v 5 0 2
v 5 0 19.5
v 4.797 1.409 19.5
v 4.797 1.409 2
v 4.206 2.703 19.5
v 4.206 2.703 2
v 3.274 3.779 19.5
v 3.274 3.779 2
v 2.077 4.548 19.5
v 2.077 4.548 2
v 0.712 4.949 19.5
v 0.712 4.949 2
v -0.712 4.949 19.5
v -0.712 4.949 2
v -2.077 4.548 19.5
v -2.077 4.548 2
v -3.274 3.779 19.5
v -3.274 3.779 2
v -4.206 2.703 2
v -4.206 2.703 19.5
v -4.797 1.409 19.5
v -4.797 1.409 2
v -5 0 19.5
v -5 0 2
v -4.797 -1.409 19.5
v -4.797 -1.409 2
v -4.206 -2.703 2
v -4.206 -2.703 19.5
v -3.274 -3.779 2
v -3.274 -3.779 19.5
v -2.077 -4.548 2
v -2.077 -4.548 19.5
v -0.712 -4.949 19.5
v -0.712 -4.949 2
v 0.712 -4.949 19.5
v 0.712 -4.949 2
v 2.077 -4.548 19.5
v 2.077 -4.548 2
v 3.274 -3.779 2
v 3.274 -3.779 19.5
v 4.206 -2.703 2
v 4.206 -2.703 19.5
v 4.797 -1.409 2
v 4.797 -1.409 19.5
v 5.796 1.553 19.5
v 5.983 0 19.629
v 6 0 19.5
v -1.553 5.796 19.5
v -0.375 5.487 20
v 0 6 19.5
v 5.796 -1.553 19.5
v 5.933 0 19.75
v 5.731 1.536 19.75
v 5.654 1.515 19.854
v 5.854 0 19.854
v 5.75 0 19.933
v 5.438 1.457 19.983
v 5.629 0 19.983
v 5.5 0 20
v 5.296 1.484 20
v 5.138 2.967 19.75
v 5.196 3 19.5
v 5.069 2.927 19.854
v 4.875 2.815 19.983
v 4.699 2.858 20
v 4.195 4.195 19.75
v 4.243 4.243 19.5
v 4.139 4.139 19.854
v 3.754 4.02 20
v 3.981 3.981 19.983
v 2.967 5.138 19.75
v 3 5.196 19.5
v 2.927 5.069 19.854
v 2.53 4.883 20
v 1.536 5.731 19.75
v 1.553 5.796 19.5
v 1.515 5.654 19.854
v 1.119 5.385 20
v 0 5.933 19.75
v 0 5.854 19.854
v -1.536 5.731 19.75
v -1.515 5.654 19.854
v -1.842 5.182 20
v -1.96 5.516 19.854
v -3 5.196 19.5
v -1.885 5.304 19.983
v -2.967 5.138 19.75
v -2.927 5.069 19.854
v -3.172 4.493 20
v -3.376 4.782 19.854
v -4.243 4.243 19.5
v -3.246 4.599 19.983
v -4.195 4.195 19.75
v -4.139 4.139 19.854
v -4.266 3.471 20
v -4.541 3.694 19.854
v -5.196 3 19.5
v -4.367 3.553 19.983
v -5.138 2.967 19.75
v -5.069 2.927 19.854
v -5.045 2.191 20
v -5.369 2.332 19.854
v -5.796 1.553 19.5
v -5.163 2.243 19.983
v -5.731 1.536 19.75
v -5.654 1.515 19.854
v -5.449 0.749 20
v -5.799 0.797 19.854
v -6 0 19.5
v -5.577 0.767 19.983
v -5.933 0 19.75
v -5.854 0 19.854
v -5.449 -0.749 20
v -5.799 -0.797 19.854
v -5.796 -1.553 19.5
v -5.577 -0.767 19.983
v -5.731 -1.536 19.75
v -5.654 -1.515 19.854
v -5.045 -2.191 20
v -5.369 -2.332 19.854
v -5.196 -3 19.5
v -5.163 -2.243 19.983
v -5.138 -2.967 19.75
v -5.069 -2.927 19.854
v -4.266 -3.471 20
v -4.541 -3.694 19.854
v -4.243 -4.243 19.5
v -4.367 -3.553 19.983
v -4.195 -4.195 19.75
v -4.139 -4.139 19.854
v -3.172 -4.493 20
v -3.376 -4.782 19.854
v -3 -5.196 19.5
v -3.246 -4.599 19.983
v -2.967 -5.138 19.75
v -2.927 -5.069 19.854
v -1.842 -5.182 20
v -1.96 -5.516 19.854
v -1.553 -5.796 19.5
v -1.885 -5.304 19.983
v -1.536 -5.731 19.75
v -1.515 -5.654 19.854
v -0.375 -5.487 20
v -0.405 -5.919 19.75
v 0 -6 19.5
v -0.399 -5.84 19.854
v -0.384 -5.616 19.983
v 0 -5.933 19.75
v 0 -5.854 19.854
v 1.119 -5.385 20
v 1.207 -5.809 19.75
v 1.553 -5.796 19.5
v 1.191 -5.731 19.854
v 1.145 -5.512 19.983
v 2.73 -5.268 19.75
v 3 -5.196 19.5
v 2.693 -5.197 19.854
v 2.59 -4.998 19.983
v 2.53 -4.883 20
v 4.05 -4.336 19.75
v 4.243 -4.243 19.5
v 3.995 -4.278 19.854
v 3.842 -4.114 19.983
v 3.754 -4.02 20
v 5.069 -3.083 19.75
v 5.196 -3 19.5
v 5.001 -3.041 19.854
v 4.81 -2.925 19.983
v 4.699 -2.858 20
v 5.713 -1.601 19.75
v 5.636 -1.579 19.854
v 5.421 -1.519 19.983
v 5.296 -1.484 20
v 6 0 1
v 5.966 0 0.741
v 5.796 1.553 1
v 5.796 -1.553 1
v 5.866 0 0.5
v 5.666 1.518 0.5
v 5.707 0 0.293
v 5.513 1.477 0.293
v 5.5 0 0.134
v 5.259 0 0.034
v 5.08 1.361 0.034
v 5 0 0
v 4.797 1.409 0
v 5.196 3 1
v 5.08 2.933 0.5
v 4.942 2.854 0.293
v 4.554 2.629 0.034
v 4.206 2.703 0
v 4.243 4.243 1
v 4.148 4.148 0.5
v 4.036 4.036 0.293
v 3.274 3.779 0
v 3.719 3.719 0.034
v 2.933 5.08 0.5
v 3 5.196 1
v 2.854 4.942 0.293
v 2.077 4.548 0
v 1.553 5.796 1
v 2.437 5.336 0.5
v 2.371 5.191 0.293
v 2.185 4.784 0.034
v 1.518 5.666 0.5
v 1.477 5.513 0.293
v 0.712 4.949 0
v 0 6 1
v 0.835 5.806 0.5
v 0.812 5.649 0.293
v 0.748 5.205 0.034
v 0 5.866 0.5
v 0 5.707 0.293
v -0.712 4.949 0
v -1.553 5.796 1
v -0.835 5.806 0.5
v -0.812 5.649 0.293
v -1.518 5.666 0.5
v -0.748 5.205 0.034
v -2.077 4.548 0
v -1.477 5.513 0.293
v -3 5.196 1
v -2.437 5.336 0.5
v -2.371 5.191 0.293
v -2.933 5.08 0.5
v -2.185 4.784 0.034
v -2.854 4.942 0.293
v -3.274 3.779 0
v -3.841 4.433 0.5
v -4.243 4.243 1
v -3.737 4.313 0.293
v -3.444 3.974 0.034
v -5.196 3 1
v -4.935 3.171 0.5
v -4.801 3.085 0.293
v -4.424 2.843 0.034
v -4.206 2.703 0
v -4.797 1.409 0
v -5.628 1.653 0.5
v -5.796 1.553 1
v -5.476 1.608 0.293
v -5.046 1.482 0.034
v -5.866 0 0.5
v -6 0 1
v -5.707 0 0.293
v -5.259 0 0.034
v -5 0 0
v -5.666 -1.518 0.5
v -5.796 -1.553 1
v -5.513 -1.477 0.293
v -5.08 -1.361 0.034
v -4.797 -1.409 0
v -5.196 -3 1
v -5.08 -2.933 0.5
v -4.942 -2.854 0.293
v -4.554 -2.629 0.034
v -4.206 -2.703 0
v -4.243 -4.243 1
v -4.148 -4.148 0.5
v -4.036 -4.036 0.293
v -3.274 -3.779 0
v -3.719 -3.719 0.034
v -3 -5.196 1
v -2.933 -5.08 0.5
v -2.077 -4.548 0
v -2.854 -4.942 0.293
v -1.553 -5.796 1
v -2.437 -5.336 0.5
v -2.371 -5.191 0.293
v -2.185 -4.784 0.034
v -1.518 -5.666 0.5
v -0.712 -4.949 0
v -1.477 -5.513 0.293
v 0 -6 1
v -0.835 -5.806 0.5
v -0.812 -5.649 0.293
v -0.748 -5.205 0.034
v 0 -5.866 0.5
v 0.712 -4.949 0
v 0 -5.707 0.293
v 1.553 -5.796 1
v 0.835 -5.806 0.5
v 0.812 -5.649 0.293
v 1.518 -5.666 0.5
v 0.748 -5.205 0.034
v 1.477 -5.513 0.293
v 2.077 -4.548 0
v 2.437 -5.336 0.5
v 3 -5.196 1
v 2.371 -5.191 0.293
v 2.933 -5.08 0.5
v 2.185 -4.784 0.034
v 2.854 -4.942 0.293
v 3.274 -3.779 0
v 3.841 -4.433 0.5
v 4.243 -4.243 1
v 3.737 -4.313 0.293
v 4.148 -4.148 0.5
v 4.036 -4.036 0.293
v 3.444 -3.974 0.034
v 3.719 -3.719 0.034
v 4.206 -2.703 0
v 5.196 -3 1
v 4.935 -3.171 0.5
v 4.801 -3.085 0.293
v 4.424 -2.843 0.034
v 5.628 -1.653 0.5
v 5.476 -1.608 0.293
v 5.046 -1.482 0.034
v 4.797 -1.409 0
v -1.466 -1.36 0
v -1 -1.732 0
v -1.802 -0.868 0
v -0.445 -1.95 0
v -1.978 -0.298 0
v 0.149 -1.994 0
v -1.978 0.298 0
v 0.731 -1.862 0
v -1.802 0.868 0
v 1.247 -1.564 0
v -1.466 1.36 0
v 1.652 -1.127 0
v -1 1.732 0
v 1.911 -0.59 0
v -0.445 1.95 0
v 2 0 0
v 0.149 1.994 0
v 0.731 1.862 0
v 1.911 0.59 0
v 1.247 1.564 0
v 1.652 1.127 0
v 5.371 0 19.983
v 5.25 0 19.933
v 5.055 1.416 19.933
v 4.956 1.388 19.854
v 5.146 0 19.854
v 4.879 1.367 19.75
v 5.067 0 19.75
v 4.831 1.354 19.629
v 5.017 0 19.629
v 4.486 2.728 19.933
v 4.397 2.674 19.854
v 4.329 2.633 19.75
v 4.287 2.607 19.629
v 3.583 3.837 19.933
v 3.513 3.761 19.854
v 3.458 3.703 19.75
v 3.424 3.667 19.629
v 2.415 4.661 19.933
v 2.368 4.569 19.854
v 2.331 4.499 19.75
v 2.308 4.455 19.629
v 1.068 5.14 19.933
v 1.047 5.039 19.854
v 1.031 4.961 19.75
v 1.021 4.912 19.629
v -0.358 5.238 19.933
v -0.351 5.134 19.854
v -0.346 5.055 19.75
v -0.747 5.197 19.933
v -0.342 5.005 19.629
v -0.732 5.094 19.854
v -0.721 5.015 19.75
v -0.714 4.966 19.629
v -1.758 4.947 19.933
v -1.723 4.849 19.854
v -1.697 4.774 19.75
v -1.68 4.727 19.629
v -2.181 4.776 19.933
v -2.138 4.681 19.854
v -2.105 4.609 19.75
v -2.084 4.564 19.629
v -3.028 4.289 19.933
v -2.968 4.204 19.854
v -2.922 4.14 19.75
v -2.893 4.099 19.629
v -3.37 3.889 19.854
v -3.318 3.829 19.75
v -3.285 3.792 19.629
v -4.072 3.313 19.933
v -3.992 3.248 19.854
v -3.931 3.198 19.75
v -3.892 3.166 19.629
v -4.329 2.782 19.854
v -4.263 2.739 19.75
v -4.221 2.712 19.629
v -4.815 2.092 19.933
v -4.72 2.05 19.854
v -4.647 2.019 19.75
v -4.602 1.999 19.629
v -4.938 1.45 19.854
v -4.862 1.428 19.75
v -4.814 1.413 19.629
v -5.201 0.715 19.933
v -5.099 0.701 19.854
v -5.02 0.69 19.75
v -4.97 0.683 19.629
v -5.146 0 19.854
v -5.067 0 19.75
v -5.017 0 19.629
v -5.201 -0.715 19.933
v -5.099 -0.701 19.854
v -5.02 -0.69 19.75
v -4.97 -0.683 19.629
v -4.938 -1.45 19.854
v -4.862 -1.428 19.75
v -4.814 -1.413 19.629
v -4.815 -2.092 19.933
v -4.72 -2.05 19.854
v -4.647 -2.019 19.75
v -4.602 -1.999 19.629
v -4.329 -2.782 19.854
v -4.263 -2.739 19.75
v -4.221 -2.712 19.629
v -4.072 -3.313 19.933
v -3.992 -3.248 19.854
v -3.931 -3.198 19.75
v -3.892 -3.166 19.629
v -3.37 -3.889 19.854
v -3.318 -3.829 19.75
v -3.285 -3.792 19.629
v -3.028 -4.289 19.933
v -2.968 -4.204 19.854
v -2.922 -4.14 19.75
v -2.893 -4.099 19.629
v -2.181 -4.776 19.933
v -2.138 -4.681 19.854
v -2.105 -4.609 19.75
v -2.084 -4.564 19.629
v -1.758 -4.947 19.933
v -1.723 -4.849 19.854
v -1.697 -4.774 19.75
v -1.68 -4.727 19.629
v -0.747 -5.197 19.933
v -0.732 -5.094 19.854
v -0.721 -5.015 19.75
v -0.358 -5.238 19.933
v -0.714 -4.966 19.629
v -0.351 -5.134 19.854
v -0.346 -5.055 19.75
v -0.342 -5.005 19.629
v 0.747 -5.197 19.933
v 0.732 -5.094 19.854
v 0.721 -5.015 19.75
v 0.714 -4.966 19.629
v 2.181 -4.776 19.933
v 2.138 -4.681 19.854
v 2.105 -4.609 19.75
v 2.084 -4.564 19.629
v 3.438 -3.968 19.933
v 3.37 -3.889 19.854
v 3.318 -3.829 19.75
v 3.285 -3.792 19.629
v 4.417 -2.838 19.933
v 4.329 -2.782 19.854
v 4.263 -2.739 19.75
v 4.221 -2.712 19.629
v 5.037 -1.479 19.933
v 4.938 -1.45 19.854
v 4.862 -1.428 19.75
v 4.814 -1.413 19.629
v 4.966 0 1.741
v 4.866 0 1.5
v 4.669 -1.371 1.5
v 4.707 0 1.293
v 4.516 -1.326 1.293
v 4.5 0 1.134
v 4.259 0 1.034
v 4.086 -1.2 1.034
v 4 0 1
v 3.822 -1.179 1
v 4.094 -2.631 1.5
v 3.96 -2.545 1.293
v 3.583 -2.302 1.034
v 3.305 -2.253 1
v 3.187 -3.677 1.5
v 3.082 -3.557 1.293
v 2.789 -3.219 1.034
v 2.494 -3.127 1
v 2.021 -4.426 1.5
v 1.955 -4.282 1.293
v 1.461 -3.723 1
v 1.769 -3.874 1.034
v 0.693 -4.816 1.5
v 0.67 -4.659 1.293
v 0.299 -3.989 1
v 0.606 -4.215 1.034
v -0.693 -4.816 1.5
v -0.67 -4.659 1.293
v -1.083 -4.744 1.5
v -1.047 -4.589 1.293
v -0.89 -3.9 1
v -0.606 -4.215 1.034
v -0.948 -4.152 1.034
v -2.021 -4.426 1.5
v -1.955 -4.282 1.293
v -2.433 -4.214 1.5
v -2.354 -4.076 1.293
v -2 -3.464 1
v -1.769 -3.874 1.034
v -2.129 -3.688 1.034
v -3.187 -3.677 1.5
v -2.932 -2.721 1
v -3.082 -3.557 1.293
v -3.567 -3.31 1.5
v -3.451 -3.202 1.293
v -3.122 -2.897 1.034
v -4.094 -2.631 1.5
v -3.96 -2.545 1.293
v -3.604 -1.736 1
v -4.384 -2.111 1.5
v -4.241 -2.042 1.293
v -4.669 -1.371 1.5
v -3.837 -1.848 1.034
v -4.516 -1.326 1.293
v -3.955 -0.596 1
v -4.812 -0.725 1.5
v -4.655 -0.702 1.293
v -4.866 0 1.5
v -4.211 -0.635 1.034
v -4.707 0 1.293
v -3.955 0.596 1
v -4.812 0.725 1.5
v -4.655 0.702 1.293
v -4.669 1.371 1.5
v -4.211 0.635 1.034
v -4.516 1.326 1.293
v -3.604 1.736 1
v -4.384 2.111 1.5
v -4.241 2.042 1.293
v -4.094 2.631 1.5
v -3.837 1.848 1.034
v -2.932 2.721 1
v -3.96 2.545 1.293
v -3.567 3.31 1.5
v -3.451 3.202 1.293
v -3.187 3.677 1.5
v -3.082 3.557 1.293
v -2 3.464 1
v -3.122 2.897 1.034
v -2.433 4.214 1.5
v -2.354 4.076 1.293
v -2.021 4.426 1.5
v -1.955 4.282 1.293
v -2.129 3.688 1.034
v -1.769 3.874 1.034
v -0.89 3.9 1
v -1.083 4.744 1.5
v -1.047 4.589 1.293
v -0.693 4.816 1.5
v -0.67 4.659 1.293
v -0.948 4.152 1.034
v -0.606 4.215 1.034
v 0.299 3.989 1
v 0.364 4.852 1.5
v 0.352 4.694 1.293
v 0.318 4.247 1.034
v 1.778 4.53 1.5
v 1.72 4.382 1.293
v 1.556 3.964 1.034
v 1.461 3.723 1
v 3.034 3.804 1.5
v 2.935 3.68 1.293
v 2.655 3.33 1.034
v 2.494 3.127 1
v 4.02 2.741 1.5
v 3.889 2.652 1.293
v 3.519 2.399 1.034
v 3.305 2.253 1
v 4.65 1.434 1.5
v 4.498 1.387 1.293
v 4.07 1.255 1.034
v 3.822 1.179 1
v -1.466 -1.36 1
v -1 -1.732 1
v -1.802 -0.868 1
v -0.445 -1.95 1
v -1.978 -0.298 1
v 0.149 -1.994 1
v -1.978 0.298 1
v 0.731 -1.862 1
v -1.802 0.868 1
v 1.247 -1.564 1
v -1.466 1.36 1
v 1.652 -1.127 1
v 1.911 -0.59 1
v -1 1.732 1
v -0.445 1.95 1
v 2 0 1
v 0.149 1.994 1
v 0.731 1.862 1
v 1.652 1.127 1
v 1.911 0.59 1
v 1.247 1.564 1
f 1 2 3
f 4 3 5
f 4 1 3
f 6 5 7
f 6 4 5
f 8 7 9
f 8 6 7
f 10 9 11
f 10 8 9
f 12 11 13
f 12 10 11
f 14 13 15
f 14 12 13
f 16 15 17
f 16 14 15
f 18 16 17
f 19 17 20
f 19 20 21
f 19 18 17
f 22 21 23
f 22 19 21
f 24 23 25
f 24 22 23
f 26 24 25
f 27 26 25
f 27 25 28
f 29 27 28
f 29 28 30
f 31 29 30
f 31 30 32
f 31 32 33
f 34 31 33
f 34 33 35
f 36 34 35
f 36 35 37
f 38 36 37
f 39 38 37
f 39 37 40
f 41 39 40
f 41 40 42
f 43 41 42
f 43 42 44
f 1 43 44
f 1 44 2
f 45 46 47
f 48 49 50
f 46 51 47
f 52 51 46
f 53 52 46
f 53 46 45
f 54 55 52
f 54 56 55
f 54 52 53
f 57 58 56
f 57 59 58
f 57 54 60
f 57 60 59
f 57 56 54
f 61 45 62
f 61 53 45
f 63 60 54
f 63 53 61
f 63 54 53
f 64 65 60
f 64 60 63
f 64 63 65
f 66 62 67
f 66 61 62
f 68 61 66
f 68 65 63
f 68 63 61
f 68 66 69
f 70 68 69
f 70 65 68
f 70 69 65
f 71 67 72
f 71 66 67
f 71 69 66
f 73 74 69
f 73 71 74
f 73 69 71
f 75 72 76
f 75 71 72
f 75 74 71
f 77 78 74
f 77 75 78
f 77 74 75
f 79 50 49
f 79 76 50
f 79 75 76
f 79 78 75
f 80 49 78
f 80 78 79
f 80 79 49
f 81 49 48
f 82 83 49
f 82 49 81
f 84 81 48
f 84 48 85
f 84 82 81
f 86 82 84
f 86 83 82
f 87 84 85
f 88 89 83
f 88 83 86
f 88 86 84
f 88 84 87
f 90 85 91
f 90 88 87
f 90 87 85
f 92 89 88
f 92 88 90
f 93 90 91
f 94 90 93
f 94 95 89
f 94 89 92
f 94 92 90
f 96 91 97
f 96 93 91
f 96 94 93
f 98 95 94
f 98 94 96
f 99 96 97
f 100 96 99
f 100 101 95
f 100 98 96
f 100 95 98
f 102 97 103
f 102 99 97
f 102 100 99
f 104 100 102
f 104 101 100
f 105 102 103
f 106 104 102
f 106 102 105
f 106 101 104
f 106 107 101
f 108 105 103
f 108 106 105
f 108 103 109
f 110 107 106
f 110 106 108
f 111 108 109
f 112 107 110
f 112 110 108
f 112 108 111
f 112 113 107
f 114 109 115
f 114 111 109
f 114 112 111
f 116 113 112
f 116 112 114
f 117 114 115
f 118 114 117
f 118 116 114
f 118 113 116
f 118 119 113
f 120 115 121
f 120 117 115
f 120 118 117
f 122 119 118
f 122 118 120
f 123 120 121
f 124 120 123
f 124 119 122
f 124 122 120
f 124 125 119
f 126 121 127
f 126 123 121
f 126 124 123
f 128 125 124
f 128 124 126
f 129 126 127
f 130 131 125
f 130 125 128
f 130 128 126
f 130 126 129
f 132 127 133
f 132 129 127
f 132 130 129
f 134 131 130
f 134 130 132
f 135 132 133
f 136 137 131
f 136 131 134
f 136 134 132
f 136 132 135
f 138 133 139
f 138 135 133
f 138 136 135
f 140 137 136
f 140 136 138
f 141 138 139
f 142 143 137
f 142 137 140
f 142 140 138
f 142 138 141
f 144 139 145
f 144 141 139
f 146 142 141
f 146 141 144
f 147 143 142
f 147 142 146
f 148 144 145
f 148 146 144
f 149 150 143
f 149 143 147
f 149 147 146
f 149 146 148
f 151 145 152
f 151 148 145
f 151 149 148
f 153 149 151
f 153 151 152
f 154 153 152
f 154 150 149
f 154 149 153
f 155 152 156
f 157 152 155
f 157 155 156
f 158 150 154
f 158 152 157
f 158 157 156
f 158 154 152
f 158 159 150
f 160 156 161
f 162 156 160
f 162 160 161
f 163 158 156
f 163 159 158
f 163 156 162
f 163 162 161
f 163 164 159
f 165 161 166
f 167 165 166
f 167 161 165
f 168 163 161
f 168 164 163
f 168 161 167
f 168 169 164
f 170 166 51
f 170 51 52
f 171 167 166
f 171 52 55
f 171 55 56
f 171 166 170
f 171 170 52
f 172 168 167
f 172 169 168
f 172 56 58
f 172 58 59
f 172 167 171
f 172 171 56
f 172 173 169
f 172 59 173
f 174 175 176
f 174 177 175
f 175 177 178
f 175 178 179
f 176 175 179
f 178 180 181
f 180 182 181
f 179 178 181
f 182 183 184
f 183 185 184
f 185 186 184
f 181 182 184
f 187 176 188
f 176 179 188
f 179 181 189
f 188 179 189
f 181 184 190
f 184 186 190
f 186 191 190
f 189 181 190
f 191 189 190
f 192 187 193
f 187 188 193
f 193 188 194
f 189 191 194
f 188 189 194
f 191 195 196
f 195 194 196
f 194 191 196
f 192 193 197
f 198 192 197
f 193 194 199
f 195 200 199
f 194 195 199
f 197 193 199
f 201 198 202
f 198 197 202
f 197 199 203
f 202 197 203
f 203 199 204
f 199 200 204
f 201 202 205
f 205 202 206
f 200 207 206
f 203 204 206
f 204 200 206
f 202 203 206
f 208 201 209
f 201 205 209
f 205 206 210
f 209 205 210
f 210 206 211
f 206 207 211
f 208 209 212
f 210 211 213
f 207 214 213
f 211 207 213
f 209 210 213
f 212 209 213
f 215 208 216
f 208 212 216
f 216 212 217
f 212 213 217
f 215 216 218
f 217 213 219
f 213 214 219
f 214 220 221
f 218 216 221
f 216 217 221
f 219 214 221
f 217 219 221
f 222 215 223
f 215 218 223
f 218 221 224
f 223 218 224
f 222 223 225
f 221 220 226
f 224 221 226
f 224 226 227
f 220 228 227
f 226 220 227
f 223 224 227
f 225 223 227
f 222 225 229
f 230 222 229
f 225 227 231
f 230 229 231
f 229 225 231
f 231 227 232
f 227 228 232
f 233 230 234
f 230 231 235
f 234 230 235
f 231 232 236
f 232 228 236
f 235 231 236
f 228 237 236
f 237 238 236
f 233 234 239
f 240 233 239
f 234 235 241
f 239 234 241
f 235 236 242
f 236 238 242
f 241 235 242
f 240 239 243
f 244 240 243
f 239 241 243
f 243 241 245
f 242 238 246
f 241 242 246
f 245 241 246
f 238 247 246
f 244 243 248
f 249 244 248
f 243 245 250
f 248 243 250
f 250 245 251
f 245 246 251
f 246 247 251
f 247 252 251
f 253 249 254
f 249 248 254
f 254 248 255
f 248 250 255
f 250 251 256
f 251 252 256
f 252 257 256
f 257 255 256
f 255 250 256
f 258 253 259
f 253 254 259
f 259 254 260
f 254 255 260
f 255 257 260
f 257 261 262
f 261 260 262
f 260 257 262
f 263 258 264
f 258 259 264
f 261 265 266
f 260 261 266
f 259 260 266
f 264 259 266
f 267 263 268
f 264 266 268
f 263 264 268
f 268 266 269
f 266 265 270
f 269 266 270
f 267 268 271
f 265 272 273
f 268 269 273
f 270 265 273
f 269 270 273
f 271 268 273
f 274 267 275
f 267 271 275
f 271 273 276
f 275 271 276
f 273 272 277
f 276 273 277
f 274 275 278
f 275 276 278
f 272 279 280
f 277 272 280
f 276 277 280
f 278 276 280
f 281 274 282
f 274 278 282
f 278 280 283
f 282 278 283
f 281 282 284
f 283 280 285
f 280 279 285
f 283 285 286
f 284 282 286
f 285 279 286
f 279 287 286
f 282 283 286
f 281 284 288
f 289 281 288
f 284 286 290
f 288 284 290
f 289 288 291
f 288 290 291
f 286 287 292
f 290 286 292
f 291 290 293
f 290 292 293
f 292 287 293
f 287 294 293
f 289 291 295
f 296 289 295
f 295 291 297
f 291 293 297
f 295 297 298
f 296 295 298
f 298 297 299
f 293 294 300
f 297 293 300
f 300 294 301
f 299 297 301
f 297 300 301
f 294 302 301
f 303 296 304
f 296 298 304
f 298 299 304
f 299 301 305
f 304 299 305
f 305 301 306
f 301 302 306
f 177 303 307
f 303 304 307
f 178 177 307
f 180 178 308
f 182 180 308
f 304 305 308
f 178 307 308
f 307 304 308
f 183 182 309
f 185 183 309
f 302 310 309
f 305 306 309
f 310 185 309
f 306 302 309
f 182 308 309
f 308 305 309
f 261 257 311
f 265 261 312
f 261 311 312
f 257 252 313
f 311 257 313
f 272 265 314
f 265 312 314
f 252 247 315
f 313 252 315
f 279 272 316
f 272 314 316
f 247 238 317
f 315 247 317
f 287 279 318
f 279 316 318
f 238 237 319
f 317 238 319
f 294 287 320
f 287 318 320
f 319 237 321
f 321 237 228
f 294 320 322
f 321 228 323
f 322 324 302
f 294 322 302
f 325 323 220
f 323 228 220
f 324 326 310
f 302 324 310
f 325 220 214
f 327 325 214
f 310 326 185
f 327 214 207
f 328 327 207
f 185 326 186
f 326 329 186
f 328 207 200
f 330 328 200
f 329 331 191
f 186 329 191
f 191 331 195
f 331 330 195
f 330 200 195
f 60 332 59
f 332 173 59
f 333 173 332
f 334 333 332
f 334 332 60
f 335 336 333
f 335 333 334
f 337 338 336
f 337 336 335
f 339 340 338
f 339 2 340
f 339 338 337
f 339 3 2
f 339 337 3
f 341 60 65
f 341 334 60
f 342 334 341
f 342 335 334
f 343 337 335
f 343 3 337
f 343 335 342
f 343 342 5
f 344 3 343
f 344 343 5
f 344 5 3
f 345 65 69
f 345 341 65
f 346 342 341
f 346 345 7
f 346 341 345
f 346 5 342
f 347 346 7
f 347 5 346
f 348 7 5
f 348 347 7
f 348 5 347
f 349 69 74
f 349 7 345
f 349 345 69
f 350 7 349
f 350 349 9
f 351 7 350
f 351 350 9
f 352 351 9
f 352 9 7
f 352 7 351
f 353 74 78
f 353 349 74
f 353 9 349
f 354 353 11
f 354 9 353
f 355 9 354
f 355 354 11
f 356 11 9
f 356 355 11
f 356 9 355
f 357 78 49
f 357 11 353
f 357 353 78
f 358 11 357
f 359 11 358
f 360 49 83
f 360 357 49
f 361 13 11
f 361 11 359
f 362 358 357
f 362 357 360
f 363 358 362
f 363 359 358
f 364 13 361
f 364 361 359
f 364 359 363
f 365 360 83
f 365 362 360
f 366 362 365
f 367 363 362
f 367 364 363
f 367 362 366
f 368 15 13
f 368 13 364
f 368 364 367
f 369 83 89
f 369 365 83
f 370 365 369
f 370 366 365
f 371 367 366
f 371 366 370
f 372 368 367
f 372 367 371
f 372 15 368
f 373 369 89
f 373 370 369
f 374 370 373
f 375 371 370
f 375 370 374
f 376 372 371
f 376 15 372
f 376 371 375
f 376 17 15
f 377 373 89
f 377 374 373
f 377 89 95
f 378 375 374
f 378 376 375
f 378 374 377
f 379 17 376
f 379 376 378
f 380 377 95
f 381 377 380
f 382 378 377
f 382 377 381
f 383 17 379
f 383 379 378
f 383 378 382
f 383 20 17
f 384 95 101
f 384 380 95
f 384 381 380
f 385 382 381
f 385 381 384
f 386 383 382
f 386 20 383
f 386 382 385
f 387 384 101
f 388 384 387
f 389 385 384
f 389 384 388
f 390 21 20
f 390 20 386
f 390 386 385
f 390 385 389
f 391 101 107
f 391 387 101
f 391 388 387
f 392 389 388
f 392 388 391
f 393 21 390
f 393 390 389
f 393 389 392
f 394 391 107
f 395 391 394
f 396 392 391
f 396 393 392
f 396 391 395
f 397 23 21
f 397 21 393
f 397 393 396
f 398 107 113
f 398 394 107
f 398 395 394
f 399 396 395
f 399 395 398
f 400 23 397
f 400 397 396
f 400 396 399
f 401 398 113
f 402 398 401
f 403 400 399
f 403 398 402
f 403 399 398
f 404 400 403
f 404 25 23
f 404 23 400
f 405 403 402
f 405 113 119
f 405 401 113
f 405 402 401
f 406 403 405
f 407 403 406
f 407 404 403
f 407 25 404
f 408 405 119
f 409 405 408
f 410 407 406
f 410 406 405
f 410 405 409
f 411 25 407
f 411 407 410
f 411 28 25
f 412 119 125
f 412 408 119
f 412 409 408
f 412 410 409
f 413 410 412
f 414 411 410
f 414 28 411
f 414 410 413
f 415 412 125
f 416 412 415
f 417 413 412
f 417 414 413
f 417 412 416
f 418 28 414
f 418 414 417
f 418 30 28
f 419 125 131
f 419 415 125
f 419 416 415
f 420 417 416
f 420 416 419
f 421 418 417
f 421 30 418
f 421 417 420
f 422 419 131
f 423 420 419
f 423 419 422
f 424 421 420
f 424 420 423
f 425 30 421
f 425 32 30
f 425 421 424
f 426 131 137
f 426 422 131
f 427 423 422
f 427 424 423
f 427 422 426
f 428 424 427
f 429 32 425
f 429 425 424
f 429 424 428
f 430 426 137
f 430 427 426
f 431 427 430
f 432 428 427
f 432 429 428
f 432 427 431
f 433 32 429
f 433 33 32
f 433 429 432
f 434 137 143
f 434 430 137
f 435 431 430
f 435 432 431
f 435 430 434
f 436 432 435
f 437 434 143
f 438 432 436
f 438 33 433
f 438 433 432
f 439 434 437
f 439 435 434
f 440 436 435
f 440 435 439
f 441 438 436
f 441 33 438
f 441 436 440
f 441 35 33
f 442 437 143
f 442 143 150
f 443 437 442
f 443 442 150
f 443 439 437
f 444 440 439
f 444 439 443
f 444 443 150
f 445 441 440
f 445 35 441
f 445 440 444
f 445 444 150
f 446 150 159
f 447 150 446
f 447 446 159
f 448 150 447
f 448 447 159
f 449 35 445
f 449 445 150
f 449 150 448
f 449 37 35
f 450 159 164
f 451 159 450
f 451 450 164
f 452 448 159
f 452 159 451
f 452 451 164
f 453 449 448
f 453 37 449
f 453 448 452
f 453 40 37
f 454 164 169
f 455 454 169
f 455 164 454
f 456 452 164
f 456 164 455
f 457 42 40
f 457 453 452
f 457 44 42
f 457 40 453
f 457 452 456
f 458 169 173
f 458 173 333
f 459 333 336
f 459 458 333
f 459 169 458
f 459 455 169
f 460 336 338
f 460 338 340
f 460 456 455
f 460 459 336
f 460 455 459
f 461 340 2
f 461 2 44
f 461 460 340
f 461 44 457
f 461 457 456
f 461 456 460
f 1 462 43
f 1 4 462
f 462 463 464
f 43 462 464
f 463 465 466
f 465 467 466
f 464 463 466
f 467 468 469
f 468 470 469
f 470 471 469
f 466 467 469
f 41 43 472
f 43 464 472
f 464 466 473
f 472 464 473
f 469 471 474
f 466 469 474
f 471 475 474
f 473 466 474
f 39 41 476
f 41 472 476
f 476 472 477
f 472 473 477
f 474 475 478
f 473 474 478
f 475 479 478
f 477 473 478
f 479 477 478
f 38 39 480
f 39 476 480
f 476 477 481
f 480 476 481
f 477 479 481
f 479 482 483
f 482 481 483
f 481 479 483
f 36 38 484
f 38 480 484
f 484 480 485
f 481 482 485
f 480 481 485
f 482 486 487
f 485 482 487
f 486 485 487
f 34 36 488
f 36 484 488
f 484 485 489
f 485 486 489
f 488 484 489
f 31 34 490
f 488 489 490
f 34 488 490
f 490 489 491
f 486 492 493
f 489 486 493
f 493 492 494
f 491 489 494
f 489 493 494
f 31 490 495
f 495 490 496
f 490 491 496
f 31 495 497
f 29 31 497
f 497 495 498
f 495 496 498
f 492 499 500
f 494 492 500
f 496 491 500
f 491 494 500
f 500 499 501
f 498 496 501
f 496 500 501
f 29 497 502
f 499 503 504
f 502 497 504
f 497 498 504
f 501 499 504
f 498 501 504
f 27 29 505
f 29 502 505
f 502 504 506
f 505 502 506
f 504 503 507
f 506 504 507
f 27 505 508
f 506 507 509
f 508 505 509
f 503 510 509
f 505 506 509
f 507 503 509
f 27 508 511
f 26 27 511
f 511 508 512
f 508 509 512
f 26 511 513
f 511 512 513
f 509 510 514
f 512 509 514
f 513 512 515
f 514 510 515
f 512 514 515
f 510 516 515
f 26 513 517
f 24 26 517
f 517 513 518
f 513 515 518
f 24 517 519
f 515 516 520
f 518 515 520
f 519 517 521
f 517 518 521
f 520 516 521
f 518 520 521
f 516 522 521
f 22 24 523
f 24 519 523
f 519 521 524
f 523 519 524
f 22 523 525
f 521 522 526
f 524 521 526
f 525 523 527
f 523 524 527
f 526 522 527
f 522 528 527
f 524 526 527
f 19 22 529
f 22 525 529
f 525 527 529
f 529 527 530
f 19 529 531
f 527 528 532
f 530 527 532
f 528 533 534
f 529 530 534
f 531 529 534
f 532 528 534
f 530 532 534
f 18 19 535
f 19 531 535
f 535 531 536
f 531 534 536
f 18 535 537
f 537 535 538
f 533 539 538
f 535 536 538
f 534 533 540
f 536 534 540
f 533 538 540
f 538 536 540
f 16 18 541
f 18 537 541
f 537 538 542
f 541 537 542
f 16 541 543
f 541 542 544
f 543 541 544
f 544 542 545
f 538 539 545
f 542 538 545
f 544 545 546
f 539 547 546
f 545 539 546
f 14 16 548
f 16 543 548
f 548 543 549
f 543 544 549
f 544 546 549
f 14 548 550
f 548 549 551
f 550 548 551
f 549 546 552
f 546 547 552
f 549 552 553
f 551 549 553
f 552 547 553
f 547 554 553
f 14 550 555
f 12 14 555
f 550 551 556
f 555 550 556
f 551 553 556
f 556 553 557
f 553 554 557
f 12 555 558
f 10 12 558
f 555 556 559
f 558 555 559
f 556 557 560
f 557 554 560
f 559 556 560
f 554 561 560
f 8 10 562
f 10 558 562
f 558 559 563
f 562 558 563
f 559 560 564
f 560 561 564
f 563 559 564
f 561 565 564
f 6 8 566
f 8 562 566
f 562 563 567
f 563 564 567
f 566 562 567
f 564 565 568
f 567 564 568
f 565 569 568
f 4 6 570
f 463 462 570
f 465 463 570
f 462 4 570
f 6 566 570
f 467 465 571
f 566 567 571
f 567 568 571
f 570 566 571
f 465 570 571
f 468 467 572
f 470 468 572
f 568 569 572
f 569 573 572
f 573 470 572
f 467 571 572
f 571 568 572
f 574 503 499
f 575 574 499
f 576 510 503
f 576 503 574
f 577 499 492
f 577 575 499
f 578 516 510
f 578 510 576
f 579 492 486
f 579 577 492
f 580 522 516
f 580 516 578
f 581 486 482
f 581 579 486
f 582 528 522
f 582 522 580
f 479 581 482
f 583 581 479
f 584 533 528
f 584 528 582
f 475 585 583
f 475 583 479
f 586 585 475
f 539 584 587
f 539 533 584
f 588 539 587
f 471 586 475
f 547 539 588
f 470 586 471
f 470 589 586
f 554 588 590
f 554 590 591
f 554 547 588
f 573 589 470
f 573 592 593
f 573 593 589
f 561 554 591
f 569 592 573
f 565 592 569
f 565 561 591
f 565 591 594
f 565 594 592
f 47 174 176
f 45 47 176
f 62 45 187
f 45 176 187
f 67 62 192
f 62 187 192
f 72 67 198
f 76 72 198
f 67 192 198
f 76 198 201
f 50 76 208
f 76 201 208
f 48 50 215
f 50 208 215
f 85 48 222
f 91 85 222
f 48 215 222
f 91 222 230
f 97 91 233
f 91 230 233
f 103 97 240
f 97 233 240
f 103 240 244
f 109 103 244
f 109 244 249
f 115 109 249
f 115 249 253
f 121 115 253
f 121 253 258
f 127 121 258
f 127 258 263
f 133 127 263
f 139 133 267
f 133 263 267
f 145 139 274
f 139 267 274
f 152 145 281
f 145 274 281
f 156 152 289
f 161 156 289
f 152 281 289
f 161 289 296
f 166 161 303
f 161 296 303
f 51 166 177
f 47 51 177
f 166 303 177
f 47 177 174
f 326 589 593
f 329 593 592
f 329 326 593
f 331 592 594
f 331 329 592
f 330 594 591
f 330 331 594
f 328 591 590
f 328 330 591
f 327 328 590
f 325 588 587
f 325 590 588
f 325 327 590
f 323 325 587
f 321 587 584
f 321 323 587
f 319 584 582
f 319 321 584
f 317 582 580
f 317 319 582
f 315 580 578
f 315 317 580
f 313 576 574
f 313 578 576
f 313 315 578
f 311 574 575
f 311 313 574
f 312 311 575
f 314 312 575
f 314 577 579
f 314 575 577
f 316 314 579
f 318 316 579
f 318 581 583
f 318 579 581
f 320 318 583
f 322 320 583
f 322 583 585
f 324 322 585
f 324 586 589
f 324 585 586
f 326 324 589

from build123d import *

# Parameters (mm, degrees)
F0_R     = 6
F0_R_2   = 2
F1_DEPTH = 20
F2_T     = -1
F3_DEPTH = 25
F4_R     = 1
F5_R     = 0.49999


# Not quite as in the source:
# - a fillet or chamfer is up to 0.001 mm smaller than in the source, because OpenCascade refuses the exact size


with BuildPart() as f1:
    # F0 (on Top) → F1 (new body)
    with BuildSketch(Plane.XY):
        Circle(F0_R)
        Circle(F0_R_2, mode=Mode.SUBTRACT)
        Circle(F0_R_2)
    extrude(amount=F1_DEPTH)

    # F2
    f2_openings = [f1.faces().sort_by_distance(p)[0] for p in [
        (0, 0, 20),
    ]]
    offset(amount=F2_T, openings=f2_openings)

    # F0 (on Top) → F3 (cut)
    with BuildSketch(Plane.XY):
        Circle(F0_R_2)
    extrude(amount=F3_DEPTH, mode=Mode.SUBTRACT)

    # F4
    f4_edges = [f1.edges().sort_by_distance(p)[0] for p in [
        (-6, 0, 0),
        (-5, 0, 1),
    ]]
    fillet(f4_edges, radius=F4_R)

    # F5 (radius 0.5 in the source; OpenCascade refuses exactly that, so slightly less here)
    f5_edges = [f1.edges().sort_by_distance(p)[0] for p in [
        (-5, 0, 20),
        (-6, 0, 20),
    ]]
    fillet(f5_edges, radius=F5_R)


solid = f1.part
